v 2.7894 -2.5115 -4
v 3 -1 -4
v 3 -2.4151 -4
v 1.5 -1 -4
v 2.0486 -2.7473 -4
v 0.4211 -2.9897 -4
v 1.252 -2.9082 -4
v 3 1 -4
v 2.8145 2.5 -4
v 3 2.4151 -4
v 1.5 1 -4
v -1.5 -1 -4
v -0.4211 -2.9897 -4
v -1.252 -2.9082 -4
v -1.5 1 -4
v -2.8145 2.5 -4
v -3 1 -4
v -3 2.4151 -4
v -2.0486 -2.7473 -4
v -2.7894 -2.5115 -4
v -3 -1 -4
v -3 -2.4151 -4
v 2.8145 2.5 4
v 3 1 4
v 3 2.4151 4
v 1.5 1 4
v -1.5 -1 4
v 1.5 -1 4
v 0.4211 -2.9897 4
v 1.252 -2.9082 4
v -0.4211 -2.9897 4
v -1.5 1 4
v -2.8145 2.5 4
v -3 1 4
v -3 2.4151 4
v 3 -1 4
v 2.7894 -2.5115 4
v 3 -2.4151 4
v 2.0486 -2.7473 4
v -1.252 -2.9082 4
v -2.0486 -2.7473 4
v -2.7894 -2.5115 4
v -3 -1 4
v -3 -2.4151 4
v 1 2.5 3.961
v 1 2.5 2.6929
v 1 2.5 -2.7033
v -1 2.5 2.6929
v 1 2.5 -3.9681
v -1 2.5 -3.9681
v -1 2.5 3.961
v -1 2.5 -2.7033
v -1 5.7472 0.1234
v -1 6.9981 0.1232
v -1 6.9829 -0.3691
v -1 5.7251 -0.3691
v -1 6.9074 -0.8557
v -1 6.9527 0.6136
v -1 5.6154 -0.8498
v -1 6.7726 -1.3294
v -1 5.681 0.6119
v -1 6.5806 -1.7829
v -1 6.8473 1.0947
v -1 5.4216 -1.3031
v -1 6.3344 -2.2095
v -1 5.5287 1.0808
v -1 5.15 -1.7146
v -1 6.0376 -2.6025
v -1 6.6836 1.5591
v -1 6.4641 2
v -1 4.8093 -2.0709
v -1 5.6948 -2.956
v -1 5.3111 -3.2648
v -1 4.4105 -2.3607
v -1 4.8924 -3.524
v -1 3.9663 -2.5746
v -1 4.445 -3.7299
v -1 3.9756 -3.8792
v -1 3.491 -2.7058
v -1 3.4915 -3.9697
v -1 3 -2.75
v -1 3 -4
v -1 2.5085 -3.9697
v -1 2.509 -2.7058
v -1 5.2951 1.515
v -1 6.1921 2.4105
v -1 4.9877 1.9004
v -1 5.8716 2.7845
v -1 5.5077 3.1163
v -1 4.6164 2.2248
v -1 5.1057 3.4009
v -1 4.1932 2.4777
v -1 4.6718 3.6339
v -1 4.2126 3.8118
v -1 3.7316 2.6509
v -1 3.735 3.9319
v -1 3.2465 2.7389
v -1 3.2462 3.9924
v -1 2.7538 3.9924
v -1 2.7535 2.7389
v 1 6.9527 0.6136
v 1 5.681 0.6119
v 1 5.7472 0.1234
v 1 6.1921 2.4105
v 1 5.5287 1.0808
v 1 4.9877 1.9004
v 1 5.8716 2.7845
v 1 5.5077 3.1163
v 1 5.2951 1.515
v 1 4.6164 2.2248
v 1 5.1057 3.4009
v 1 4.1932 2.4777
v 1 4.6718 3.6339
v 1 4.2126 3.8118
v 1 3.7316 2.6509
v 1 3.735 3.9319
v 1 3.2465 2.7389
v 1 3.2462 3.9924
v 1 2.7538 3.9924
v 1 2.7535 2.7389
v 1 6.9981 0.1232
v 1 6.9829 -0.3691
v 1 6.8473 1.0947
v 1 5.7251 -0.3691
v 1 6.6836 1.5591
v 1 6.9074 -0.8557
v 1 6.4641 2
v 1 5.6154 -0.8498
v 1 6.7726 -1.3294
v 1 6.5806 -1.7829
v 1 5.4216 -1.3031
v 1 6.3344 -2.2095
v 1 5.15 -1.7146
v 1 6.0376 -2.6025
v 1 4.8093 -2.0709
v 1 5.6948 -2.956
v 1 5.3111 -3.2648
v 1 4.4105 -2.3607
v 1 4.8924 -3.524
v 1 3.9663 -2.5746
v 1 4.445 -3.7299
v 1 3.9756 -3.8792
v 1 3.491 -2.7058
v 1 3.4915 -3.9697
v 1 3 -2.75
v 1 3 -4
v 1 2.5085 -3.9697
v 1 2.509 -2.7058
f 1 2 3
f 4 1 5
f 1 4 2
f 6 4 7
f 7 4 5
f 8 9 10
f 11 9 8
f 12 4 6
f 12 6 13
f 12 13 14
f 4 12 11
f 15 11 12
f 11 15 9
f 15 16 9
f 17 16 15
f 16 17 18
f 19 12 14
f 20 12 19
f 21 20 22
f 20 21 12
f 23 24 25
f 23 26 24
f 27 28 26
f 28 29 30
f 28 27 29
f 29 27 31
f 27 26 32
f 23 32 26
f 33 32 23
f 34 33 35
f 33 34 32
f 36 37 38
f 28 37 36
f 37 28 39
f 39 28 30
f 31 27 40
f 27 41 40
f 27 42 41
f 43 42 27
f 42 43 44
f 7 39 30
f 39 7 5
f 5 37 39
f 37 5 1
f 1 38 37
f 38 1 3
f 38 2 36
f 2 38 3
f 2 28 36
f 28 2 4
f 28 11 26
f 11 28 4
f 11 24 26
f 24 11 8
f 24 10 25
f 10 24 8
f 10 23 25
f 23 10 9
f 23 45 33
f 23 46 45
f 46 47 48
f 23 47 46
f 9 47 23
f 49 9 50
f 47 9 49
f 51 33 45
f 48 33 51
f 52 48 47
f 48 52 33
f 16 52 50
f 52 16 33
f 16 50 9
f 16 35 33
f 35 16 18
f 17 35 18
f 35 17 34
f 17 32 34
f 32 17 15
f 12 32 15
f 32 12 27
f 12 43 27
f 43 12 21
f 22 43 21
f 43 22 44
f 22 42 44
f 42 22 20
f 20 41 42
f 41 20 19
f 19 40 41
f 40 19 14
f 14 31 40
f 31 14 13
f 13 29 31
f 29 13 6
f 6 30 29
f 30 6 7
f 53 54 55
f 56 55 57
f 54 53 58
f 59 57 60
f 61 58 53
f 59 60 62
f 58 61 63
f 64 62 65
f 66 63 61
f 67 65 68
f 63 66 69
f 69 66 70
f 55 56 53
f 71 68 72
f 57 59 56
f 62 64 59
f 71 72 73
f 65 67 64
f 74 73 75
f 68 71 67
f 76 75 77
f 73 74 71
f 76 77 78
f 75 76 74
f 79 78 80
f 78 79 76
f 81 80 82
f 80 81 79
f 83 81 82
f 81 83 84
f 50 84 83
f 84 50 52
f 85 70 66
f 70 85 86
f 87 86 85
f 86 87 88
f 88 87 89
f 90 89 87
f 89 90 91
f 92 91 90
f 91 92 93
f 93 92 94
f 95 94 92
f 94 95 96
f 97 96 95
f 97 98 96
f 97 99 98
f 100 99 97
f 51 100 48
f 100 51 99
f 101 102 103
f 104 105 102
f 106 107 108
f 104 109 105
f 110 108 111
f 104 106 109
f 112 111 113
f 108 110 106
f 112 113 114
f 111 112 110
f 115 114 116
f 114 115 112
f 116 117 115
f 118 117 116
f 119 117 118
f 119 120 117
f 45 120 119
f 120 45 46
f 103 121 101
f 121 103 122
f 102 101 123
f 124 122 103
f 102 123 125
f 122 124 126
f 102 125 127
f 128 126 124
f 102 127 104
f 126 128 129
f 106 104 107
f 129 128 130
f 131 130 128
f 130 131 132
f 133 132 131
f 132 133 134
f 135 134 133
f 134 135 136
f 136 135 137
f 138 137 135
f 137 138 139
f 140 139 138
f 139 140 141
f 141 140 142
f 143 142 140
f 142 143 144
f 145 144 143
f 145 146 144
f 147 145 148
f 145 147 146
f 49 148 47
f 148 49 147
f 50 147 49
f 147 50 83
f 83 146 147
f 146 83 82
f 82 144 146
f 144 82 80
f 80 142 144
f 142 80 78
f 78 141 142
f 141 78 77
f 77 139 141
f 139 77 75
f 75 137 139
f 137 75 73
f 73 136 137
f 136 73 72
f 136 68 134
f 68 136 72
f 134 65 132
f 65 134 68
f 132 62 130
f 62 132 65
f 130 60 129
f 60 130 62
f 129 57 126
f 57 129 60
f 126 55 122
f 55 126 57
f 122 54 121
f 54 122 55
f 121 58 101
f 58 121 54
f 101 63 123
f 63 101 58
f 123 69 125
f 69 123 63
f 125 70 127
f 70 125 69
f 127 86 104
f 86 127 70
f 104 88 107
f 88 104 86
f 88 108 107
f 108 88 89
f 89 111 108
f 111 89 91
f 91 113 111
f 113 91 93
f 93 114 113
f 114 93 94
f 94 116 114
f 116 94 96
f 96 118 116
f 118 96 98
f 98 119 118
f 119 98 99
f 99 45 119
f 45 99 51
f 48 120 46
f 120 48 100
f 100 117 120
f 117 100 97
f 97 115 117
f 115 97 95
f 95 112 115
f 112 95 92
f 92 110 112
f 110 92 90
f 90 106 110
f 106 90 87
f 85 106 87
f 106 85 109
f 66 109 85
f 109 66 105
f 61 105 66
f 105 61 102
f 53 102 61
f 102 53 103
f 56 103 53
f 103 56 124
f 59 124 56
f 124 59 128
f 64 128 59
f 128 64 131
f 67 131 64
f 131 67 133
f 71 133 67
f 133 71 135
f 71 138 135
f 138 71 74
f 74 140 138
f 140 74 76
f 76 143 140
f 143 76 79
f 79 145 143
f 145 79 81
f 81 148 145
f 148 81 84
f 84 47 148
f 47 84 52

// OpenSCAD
$fs = 0.5;
$fa = 5;

gutter = 2;
height = 6;
width = 6;
cwidth = 3;
length = 8;
loop = 8;
loopThick = 2.5;
cdepth = 2;

    union() {
        linear_extrude ( height = length, center = true)
        difference() {
            scale ([1.7,1,1]) circle(height/2);
            
            translate([height/2 + width / 2,0,0]) square (height, true);
            translate([-height/2 - width / 2,0,0]) square (height, true);
            
            translate([ cwidth / 2 + gutter/2 ,0,0]) square (gutter, true);
            translate([ -cwidth / 2 - gutter/2 ,0,0]) square (gutter, true);
            
            // chop the top off
             translate([0, height + width /2  - cdepth * 1.75 , 0 ]) square (width, true);
        }
        
        translate ([0, height / 2, 0])
        rotate ([0, 90, 0])
        linear_extrude (height=cdepth, center = true) 
        difference() { 
            circle (loop / 2);
            circle (loop / 2 - loopThick / 2);
        }
    }
